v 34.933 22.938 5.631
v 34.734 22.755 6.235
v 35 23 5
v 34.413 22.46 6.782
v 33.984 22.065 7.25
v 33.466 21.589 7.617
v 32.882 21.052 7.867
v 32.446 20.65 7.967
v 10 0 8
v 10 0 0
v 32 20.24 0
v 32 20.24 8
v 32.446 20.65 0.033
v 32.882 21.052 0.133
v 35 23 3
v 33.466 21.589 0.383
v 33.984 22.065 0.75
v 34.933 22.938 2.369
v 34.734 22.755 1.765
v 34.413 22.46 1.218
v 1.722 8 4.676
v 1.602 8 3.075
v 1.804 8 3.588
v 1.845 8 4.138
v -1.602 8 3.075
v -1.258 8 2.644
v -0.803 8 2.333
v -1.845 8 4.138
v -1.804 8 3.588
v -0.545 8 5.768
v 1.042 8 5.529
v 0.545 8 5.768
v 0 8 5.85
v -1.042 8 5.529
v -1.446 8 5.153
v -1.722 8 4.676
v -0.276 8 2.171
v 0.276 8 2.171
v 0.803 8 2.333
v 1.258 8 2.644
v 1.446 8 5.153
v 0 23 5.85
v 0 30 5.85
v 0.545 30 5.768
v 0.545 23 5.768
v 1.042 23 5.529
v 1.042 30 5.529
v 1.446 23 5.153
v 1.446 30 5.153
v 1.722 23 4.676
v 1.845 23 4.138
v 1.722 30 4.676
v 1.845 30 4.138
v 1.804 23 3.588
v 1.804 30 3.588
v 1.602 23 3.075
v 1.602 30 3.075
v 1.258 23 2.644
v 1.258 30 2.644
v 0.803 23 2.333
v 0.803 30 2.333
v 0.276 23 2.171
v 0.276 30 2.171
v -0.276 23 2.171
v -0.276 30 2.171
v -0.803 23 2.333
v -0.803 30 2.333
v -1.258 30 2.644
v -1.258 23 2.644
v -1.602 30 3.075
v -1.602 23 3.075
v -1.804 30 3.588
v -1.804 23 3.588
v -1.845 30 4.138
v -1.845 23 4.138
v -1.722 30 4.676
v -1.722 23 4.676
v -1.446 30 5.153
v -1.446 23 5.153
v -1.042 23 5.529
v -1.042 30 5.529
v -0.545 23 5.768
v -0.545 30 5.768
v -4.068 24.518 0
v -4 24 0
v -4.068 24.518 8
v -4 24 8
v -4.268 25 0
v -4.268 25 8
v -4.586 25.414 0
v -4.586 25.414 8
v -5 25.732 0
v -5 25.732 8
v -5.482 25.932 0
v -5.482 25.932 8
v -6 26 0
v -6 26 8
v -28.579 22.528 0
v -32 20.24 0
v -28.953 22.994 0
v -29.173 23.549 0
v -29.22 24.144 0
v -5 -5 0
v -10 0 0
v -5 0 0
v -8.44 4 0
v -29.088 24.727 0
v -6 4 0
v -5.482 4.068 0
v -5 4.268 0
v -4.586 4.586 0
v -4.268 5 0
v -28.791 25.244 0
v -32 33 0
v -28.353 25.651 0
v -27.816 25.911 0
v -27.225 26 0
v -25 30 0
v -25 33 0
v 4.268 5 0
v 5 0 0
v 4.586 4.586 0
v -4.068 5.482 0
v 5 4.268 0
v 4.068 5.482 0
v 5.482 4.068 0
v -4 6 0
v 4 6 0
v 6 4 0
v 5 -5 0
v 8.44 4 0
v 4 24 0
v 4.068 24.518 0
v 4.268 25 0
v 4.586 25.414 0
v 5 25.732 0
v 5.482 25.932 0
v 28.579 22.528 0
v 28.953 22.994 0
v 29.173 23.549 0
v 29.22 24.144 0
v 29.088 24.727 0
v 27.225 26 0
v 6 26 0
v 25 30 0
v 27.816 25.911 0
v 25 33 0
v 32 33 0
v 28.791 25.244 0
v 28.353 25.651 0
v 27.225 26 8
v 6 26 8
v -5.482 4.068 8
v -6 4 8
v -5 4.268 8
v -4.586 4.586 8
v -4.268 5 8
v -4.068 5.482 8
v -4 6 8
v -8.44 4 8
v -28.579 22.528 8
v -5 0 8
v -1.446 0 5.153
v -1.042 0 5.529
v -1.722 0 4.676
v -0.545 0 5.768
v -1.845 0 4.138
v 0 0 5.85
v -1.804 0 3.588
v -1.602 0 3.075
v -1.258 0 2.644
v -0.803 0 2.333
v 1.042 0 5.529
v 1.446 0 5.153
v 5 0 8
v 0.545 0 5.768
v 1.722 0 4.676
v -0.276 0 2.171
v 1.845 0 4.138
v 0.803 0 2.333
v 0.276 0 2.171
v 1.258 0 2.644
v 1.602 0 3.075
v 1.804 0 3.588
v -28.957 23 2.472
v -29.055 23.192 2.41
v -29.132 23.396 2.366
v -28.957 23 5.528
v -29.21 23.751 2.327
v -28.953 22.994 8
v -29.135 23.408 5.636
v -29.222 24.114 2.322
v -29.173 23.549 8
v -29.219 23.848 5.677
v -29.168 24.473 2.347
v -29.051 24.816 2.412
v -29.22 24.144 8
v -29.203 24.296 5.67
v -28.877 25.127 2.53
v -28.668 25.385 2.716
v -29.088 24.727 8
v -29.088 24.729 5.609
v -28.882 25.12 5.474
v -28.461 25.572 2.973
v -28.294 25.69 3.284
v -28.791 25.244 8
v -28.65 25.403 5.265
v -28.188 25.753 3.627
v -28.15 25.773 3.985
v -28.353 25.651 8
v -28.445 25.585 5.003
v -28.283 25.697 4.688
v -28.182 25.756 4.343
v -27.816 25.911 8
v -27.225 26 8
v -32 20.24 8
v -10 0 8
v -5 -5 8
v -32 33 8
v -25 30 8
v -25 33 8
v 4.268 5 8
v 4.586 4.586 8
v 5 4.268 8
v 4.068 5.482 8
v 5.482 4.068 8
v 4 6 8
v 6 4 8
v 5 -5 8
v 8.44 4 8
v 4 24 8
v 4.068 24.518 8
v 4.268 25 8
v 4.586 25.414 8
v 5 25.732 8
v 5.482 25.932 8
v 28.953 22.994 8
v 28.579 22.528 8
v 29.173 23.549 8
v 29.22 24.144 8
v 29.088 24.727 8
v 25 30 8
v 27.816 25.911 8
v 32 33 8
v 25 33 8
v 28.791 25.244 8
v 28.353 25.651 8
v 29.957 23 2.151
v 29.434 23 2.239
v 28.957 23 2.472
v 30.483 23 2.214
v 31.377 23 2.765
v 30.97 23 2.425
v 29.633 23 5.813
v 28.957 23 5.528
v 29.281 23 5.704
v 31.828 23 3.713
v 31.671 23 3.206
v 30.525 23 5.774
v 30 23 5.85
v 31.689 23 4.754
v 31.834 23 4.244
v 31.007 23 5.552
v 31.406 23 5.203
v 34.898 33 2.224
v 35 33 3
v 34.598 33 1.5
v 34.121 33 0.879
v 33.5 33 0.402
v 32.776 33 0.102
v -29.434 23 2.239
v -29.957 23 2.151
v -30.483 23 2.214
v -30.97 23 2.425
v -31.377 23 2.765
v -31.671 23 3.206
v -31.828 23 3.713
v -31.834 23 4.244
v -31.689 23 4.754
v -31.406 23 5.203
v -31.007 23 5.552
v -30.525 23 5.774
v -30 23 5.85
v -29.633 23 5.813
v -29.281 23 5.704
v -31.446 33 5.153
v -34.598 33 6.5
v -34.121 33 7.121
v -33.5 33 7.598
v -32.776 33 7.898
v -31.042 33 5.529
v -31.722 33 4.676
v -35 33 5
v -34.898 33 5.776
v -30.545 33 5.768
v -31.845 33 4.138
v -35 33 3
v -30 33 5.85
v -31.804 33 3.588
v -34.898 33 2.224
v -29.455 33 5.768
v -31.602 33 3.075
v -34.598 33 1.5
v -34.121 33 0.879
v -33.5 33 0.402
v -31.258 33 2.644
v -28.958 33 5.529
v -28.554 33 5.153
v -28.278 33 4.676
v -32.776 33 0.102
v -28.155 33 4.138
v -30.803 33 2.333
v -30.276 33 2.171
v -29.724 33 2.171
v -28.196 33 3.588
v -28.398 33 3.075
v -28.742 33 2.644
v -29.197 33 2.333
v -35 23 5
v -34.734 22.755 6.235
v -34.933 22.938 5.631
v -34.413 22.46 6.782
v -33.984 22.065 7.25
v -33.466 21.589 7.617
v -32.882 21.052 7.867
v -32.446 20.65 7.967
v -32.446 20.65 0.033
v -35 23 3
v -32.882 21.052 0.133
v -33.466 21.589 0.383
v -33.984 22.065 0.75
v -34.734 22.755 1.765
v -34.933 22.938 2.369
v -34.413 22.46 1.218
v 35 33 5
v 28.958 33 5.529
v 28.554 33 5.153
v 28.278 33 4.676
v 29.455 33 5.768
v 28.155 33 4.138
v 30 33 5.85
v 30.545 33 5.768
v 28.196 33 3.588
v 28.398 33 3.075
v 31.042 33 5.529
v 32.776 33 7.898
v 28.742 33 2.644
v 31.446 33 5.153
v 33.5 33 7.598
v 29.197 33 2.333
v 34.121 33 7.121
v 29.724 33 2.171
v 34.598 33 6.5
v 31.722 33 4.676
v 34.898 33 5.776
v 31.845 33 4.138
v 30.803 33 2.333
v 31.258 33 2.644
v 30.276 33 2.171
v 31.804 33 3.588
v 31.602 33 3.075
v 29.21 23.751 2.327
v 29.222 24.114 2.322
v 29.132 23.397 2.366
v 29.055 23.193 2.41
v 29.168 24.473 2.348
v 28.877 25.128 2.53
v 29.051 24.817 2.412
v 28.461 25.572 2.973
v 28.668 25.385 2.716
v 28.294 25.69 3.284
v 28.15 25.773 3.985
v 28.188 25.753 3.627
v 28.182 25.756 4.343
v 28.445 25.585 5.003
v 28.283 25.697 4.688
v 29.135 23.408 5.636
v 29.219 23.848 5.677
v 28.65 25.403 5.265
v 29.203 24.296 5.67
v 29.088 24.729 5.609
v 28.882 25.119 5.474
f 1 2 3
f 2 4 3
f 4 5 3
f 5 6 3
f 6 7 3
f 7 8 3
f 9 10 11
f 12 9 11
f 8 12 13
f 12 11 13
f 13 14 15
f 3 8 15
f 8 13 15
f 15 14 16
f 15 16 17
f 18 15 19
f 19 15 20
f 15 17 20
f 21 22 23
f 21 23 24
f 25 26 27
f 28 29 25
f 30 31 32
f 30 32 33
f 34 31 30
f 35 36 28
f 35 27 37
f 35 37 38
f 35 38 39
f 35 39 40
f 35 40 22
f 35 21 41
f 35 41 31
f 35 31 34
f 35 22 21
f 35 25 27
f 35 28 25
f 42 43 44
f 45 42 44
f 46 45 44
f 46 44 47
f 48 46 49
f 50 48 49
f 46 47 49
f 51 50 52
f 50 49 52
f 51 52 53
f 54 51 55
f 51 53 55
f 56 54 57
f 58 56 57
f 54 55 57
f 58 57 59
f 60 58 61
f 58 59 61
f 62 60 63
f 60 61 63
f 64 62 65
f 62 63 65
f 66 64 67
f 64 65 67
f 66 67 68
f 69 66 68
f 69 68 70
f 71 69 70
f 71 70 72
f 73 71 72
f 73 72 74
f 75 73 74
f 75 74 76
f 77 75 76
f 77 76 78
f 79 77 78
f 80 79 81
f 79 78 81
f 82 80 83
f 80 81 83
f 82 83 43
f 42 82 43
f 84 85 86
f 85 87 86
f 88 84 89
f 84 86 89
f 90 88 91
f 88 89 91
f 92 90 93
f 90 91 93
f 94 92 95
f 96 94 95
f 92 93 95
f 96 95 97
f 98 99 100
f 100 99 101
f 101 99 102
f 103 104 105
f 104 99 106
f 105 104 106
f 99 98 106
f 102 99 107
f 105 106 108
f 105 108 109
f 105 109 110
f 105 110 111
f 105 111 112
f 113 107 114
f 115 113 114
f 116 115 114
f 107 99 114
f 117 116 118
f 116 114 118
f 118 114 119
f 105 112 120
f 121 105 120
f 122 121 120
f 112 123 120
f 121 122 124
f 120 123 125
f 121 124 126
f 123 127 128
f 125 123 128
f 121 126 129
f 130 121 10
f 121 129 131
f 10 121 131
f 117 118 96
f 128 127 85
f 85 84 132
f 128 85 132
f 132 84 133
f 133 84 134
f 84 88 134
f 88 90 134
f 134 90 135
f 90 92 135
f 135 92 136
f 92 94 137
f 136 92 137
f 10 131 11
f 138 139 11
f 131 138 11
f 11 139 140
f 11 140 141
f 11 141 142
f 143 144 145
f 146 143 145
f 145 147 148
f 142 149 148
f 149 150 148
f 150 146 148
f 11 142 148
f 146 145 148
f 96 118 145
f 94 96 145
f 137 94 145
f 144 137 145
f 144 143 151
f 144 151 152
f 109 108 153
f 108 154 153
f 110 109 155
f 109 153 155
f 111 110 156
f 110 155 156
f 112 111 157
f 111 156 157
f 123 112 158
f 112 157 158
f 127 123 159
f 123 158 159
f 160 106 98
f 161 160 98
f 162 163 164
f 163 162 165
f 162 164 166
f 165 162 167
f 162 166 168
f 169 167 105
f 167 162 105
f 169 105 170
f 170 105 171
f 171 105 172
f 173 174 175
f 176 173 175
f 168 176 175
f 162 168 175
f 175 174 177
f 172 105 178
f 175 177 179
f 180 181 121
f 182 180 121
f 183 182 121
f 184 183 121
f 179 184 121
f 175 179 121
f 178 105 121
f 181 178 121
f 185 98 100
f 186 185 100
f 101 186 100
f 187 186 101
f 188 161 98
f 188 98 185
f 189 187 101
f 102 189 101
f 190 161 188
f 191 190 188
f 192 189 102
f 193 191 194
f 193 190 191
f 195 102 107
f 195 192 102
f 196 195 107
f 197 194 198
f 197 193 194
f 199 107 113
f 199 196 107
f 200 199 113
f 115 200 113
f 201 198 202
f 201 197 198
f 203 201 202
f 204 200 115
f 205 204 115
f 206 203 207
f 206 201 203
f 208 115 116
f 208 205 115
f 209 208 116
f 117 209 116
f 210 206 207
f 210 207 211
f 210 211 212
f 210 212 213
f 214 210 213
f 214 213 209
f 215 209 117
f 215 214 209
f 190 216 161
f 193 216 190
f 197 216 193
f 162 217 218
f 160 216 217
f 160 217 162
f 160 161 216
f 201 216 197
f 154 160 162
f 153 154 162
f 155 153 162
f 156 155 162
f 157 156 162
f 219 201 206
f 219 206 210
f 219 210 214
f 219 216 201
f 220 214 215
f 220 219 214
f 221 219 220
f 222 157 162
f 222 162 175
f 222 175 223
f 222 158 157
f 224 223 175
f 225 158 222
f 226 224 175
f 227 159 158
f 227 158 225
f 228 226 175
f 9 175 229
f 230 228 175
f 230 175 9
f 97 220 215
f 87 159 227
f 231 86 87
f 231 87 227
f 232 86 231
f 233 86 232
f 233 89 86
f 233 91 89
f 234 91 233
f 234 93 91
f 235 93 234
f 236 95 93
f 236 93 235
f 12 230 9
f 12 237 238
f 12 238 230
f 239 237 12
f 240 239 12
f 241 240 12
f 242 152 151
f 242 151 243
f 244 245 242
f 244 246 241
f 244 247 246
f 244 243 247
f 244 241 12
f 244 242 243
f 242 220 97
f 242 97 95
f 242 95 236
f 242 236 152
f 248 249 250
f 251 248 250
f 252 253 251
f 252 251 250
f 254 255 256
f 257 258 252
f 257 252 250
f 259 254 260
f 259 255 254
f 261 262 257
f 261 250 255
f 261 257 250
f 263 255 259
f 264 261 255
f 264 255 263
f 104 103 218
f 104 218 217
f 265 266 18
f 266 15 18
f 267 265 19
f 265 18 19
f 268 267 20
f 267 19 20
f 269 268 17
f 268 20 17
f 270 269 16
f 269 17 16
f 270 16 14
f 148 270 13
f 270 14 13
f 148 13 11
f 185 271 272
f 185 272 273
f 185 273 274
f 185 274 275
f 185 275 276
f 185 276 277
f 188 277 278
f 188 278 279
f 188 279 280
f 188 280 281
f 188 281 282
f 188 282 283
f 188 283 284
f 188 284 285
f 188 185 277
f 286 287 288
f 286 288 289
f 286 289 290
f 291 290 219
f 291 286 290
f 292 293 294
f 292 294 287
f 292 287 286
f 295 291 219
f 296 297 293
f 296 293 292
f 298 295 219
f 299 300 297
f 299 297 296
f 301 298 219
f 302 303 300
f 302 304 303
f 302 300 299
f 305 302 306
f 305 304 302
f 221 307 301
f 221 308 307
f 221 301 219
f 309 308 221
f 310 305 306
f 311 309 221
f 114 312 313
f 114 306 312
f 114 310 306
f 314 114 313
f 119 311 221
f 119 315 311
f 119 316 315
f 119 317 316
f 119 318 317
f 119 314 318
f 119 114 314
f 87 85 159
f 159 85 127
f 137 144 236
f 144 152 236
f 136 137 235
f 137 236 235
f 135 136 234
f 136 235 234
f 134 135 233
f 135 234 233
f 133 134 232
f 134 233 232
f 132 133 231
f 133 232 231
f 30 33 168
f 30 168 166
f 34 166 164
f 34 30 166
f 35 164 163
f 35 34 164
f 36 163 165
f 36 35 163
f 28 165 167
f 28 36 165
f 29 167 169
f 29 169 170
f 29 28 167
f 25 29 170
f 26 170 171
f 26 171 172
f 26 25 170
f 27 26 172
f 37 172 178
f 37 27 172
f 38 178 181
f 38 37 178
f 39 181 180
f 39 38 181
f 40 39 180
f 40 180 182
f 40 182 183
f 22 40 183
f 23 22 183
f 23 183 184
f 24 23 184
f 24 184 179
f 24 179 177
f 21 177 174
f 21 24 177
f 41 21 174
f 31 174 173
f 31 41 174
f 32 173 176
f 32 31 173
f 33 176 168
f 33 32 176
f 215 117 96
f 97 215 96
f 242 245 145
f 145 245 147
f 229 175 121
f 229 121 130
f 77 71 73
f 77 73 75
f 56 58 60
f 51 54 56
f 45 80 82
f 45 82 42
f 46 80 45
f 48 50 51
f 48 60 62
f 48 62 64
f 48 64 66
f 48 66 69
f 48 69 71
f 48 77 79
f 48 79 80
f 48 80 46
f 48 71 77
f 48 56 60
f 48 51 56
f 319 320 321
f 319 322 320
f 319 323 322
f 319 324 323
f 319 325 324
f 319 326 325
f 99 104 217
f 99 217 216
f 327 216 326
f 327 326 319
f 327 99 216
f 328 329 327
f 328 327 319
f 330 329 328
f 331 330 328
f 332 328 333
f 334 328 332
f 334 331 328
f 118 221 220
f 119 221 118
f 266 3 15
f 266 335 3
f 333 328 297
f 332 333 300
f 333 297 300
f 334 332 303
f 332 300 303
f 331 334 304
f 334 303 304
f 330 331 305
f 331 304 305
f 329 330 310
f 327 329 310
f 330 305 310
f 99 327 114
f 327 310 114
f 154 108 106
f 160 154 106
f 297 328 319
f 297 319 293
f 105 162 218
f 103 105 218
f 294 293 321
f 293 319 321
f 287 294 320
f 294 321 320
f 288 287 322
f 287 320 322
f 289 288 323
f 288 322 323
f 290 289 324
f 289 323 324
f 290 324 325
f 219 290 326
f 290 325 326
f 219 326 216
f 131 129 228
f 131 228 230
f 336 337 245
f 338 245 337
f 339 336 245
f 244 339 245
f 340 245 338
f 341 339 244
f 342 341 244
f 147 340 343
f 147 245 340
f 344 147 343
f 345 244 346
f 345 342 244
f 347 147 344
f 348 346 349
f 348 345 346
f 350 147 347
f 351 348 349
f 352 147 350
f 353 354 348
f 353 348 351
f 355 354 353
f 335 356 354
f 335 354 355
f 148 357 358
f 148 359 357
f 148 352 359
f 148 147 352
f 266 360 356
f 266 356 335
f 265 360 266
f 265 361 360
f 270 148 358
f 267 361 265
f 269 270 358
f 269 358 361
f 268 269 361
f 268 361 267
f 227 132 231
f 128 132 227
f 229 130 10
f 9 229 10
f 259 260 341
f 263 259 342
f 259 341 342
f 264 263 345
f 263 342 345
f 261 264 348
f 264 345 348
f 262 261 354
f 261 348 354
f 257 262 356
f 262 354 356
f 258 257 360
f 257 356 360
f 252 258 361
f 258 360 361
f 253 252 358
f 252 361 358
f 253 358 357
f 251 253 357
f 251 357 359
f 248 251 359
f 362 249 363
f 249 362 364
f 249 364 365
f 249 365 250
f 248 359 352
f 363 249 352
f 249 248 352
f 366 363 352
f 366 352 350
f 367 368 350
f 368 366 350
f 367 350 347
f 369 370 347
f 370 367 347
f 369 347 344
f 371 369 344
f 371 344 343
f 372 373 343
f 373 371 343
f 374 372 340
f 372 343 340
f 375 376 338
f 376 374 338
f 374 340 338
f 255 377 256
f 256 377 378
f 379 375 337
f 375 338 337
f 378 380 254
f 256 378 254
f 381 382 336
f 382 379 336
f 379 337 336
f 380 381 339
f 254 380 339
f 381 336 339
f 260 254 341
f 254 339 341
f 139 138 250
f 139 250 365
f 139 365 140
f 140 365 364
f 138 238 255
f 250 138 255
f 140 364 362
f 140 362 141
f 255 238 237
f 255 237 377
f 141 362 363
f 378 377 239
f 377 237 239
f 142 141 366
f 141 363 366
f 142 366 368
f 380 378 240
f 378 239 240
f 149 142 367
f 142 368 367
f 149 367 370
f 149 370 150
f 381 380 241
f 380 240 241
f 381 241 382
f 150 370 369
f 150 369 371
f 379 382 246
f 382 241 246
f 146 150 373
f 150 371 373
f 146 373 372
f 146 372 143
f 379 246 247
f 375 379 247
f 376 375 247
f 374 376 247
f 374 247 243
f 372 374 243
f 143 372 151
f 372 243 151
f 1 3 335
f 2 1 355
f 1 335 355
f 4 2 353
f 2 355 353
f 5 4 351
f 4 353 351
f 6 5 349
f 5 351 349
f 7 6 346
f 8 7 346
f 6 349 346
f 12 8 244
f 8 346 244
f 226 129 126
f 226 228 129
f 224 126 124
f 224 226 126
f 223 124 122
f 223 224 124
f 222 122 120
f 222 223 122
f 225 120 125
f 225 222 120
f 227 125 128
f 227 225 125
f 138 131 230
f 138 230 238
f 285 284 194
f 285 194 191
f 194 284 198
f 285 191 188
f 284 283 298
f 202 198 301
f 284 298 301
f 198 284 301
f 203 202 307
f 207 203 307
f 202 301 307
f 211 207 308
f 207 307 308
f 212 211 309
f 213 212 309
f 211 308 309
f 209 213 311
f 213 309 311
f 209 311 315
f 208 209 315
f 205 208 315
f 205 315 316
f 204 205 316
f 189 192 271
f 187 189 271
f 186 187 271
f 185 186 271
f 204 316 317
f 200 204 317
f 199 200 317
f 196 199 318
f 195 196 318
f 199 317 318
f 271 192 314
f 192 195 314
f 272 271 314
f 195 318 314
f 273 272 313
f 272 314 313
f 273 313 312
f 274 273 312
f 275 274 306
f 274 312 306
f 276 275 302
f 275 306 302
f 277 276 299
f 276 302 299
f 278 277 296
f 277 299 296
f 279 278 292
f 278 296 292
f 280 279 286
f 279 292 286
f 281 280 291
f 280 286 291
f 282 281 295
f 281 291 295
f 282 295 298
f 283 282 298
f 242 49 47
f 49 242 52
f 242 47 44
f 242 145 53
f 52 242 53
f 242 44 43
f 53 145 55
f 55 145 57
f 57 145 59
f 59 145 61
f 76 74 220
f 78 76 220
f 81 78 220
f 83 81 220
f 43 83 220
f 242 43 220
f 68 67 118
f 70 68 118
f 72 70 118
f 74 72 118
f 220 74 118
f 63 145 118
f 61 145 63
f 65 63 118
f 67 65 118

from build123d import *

# Parameters (mm, degrees)
EXTRUDE_1_DEPTH     = 8
FILLET_1_R          = 2
SKETCH_2_R          = 1.85
CUT_EXTRUDE_1_DEPTH = 7
CUT_EXTRUDE_START   = -8
SKETCH_3_R          = 1.85
CUT_EXTRUDE_2_DEPTH = 8
EXTRUDE_2_DEPTH     = 8
EXTRUDE_START       = 3
SKETCH_5_W          = 10
SKETCH_5_H          = 8
SKETCH_5_R          = 1.85
EXTRUDE_3_DEPTH     = 3
FILLET_2_R          = 3


with BuildPart() as part:
    # ｽｹｯﾁ1 → ﾎﾞｽ - 押し出し1 (new body)
    with BuildSketch(Plane.XY):
        Polygon((0, 0), (-10, 0), (-35, 23), (-35, 30), (0, 30), align=None)
        Polygon((-4, 26), (-4, 4), (-8.439899913, 4), (-32.352943391, 26), align=None, mode=Mode.SUBTRACT)
    extrude_1 = extrude(amount=EXTRUDE_1_DEPTH)

    # ﾐﾗｰ1: ﾎﾞｽ - 押し出し1 across plane
    add(extrude_1.mirror(Plane(origin=(0, 30, 8), x_dir=(0, 0, 1), z_dir=(-1, 0, 0))))

    # ﾌｨﾚｯﾄ1
    fillet_1_edges = [part.edges().sort_by_distance(p)[0] for p in [
        (-4, 26, 4),
        (-32.352943391, 26, 4),
        (-4, 4, 4),
        (4, 26, 4),
        (4, 4, 4),
        (32.352943391, 26, 4),
    ]]
    fillet(fillet_1_edges, radius=FILLET_1_R)

    # ｽｹｯﾁ2 → ｶｯﾄ - 押し出し1 (cut)
    with BuildSketch(Plane(origin=(0, 30, 0), x_dir=(1, 0, 0), z_dir=(0, 1, 0))):
        with Locations(Location((0, -4, 0), (0, 0, 270))):
            Circle(SKETCH_2_R)
        with Locations(Location((-30, -4, 0), (0, 0, 270))):
            Circle(SKETCH_2_R)
        with Locations(Location((30, -4, 0), (0, 0, 270))):
            Circle(SKETCH_2_R)
    extrude(amount=-CUT_EXTRUDE_1_DEPTH, mode=Mode.SUBTRACT)

    # ｽｹｯﾁ3 → ｶｯﾄ - 押し出し2 (cut)
    with BuildSketch(Plane(origin=(0, 0, 0), x_dir=(-1, 0, 0), z_dir=(0, -1, 0)).offset(CUT_EXTRUDE_START)):
        with Locations(Location((0, -4, 0), (0, 0, 270))):
            Circle(SKETCH_3_R)
    extrude(amount=CUT_EXTRUDE_2_DEPTH, mode=Mode.SUBTRACT)

    # ｽｹｯﾁ4 → ﾎﾞｽ - 押し出し2 (add)
    with BuildSketch(Plane(origin=(0, 0, 0), x_dir=(-1, 0, 0), z_dir=(0, 0, -1))):
        Polygon((5, 0), (5, -5), (10, 0), align=None)
        Polygon((-10, 0), (-5, 0), (-5, -5), align=None)
    extrude(amount=-EXTRUDE_2_DEPTH)

    # ｽｹｯﾁ5 → ﾎﾞｽ - 押し出し3 (add)
    # profile 1 of 2: a face of its own
    with BuildSketch(Plane(origin=(0, 30, 0), x_dir=(1, 0, 0), z_dir=(0, 1, 0)).offset(EXTRUDE_START)):
        with Locations((30, -4)):
            Rectangle(SKETCH_5_W, SKETCH_5_H)
        with Locations(Location((30, -4, 0), (0, 0, 270))):
            Circle(SKETCH_5_R, mode=Mode.SUBTRACT)
    # profile 2 of 2: a face of its own
    with BuildSketch(Plane(origin=(0, 30, 0), x_dir=(1, 0, 0), z_dir=(0, 1, 0)).offset(EXTRUDE_START)):
        with Locations((-30, -4)):
            Rectangle(SKETCH_5_W, SKETCH_5_H)
        with Locations(Location((-30, -4, 0), (0, 0, 270))):
            Circle(SKETCH_5_R, mode=Mode.SUBTRACT)
    extrude(amount=-EXTRUDE_3_DEPTH)

    # ﾌｨﾚｯﾄ2
    fillet_2_edges = [part.edges().sort_by_distance(p)[0] for p in [
        (-35, 28, 8),
        (35, 28, 8),
        (35, 28, 0),
        (-35, 28, 0),
    ]]
    fillet(fillet_2_edges, radius=FILLET_2_R)


solid = part.part
